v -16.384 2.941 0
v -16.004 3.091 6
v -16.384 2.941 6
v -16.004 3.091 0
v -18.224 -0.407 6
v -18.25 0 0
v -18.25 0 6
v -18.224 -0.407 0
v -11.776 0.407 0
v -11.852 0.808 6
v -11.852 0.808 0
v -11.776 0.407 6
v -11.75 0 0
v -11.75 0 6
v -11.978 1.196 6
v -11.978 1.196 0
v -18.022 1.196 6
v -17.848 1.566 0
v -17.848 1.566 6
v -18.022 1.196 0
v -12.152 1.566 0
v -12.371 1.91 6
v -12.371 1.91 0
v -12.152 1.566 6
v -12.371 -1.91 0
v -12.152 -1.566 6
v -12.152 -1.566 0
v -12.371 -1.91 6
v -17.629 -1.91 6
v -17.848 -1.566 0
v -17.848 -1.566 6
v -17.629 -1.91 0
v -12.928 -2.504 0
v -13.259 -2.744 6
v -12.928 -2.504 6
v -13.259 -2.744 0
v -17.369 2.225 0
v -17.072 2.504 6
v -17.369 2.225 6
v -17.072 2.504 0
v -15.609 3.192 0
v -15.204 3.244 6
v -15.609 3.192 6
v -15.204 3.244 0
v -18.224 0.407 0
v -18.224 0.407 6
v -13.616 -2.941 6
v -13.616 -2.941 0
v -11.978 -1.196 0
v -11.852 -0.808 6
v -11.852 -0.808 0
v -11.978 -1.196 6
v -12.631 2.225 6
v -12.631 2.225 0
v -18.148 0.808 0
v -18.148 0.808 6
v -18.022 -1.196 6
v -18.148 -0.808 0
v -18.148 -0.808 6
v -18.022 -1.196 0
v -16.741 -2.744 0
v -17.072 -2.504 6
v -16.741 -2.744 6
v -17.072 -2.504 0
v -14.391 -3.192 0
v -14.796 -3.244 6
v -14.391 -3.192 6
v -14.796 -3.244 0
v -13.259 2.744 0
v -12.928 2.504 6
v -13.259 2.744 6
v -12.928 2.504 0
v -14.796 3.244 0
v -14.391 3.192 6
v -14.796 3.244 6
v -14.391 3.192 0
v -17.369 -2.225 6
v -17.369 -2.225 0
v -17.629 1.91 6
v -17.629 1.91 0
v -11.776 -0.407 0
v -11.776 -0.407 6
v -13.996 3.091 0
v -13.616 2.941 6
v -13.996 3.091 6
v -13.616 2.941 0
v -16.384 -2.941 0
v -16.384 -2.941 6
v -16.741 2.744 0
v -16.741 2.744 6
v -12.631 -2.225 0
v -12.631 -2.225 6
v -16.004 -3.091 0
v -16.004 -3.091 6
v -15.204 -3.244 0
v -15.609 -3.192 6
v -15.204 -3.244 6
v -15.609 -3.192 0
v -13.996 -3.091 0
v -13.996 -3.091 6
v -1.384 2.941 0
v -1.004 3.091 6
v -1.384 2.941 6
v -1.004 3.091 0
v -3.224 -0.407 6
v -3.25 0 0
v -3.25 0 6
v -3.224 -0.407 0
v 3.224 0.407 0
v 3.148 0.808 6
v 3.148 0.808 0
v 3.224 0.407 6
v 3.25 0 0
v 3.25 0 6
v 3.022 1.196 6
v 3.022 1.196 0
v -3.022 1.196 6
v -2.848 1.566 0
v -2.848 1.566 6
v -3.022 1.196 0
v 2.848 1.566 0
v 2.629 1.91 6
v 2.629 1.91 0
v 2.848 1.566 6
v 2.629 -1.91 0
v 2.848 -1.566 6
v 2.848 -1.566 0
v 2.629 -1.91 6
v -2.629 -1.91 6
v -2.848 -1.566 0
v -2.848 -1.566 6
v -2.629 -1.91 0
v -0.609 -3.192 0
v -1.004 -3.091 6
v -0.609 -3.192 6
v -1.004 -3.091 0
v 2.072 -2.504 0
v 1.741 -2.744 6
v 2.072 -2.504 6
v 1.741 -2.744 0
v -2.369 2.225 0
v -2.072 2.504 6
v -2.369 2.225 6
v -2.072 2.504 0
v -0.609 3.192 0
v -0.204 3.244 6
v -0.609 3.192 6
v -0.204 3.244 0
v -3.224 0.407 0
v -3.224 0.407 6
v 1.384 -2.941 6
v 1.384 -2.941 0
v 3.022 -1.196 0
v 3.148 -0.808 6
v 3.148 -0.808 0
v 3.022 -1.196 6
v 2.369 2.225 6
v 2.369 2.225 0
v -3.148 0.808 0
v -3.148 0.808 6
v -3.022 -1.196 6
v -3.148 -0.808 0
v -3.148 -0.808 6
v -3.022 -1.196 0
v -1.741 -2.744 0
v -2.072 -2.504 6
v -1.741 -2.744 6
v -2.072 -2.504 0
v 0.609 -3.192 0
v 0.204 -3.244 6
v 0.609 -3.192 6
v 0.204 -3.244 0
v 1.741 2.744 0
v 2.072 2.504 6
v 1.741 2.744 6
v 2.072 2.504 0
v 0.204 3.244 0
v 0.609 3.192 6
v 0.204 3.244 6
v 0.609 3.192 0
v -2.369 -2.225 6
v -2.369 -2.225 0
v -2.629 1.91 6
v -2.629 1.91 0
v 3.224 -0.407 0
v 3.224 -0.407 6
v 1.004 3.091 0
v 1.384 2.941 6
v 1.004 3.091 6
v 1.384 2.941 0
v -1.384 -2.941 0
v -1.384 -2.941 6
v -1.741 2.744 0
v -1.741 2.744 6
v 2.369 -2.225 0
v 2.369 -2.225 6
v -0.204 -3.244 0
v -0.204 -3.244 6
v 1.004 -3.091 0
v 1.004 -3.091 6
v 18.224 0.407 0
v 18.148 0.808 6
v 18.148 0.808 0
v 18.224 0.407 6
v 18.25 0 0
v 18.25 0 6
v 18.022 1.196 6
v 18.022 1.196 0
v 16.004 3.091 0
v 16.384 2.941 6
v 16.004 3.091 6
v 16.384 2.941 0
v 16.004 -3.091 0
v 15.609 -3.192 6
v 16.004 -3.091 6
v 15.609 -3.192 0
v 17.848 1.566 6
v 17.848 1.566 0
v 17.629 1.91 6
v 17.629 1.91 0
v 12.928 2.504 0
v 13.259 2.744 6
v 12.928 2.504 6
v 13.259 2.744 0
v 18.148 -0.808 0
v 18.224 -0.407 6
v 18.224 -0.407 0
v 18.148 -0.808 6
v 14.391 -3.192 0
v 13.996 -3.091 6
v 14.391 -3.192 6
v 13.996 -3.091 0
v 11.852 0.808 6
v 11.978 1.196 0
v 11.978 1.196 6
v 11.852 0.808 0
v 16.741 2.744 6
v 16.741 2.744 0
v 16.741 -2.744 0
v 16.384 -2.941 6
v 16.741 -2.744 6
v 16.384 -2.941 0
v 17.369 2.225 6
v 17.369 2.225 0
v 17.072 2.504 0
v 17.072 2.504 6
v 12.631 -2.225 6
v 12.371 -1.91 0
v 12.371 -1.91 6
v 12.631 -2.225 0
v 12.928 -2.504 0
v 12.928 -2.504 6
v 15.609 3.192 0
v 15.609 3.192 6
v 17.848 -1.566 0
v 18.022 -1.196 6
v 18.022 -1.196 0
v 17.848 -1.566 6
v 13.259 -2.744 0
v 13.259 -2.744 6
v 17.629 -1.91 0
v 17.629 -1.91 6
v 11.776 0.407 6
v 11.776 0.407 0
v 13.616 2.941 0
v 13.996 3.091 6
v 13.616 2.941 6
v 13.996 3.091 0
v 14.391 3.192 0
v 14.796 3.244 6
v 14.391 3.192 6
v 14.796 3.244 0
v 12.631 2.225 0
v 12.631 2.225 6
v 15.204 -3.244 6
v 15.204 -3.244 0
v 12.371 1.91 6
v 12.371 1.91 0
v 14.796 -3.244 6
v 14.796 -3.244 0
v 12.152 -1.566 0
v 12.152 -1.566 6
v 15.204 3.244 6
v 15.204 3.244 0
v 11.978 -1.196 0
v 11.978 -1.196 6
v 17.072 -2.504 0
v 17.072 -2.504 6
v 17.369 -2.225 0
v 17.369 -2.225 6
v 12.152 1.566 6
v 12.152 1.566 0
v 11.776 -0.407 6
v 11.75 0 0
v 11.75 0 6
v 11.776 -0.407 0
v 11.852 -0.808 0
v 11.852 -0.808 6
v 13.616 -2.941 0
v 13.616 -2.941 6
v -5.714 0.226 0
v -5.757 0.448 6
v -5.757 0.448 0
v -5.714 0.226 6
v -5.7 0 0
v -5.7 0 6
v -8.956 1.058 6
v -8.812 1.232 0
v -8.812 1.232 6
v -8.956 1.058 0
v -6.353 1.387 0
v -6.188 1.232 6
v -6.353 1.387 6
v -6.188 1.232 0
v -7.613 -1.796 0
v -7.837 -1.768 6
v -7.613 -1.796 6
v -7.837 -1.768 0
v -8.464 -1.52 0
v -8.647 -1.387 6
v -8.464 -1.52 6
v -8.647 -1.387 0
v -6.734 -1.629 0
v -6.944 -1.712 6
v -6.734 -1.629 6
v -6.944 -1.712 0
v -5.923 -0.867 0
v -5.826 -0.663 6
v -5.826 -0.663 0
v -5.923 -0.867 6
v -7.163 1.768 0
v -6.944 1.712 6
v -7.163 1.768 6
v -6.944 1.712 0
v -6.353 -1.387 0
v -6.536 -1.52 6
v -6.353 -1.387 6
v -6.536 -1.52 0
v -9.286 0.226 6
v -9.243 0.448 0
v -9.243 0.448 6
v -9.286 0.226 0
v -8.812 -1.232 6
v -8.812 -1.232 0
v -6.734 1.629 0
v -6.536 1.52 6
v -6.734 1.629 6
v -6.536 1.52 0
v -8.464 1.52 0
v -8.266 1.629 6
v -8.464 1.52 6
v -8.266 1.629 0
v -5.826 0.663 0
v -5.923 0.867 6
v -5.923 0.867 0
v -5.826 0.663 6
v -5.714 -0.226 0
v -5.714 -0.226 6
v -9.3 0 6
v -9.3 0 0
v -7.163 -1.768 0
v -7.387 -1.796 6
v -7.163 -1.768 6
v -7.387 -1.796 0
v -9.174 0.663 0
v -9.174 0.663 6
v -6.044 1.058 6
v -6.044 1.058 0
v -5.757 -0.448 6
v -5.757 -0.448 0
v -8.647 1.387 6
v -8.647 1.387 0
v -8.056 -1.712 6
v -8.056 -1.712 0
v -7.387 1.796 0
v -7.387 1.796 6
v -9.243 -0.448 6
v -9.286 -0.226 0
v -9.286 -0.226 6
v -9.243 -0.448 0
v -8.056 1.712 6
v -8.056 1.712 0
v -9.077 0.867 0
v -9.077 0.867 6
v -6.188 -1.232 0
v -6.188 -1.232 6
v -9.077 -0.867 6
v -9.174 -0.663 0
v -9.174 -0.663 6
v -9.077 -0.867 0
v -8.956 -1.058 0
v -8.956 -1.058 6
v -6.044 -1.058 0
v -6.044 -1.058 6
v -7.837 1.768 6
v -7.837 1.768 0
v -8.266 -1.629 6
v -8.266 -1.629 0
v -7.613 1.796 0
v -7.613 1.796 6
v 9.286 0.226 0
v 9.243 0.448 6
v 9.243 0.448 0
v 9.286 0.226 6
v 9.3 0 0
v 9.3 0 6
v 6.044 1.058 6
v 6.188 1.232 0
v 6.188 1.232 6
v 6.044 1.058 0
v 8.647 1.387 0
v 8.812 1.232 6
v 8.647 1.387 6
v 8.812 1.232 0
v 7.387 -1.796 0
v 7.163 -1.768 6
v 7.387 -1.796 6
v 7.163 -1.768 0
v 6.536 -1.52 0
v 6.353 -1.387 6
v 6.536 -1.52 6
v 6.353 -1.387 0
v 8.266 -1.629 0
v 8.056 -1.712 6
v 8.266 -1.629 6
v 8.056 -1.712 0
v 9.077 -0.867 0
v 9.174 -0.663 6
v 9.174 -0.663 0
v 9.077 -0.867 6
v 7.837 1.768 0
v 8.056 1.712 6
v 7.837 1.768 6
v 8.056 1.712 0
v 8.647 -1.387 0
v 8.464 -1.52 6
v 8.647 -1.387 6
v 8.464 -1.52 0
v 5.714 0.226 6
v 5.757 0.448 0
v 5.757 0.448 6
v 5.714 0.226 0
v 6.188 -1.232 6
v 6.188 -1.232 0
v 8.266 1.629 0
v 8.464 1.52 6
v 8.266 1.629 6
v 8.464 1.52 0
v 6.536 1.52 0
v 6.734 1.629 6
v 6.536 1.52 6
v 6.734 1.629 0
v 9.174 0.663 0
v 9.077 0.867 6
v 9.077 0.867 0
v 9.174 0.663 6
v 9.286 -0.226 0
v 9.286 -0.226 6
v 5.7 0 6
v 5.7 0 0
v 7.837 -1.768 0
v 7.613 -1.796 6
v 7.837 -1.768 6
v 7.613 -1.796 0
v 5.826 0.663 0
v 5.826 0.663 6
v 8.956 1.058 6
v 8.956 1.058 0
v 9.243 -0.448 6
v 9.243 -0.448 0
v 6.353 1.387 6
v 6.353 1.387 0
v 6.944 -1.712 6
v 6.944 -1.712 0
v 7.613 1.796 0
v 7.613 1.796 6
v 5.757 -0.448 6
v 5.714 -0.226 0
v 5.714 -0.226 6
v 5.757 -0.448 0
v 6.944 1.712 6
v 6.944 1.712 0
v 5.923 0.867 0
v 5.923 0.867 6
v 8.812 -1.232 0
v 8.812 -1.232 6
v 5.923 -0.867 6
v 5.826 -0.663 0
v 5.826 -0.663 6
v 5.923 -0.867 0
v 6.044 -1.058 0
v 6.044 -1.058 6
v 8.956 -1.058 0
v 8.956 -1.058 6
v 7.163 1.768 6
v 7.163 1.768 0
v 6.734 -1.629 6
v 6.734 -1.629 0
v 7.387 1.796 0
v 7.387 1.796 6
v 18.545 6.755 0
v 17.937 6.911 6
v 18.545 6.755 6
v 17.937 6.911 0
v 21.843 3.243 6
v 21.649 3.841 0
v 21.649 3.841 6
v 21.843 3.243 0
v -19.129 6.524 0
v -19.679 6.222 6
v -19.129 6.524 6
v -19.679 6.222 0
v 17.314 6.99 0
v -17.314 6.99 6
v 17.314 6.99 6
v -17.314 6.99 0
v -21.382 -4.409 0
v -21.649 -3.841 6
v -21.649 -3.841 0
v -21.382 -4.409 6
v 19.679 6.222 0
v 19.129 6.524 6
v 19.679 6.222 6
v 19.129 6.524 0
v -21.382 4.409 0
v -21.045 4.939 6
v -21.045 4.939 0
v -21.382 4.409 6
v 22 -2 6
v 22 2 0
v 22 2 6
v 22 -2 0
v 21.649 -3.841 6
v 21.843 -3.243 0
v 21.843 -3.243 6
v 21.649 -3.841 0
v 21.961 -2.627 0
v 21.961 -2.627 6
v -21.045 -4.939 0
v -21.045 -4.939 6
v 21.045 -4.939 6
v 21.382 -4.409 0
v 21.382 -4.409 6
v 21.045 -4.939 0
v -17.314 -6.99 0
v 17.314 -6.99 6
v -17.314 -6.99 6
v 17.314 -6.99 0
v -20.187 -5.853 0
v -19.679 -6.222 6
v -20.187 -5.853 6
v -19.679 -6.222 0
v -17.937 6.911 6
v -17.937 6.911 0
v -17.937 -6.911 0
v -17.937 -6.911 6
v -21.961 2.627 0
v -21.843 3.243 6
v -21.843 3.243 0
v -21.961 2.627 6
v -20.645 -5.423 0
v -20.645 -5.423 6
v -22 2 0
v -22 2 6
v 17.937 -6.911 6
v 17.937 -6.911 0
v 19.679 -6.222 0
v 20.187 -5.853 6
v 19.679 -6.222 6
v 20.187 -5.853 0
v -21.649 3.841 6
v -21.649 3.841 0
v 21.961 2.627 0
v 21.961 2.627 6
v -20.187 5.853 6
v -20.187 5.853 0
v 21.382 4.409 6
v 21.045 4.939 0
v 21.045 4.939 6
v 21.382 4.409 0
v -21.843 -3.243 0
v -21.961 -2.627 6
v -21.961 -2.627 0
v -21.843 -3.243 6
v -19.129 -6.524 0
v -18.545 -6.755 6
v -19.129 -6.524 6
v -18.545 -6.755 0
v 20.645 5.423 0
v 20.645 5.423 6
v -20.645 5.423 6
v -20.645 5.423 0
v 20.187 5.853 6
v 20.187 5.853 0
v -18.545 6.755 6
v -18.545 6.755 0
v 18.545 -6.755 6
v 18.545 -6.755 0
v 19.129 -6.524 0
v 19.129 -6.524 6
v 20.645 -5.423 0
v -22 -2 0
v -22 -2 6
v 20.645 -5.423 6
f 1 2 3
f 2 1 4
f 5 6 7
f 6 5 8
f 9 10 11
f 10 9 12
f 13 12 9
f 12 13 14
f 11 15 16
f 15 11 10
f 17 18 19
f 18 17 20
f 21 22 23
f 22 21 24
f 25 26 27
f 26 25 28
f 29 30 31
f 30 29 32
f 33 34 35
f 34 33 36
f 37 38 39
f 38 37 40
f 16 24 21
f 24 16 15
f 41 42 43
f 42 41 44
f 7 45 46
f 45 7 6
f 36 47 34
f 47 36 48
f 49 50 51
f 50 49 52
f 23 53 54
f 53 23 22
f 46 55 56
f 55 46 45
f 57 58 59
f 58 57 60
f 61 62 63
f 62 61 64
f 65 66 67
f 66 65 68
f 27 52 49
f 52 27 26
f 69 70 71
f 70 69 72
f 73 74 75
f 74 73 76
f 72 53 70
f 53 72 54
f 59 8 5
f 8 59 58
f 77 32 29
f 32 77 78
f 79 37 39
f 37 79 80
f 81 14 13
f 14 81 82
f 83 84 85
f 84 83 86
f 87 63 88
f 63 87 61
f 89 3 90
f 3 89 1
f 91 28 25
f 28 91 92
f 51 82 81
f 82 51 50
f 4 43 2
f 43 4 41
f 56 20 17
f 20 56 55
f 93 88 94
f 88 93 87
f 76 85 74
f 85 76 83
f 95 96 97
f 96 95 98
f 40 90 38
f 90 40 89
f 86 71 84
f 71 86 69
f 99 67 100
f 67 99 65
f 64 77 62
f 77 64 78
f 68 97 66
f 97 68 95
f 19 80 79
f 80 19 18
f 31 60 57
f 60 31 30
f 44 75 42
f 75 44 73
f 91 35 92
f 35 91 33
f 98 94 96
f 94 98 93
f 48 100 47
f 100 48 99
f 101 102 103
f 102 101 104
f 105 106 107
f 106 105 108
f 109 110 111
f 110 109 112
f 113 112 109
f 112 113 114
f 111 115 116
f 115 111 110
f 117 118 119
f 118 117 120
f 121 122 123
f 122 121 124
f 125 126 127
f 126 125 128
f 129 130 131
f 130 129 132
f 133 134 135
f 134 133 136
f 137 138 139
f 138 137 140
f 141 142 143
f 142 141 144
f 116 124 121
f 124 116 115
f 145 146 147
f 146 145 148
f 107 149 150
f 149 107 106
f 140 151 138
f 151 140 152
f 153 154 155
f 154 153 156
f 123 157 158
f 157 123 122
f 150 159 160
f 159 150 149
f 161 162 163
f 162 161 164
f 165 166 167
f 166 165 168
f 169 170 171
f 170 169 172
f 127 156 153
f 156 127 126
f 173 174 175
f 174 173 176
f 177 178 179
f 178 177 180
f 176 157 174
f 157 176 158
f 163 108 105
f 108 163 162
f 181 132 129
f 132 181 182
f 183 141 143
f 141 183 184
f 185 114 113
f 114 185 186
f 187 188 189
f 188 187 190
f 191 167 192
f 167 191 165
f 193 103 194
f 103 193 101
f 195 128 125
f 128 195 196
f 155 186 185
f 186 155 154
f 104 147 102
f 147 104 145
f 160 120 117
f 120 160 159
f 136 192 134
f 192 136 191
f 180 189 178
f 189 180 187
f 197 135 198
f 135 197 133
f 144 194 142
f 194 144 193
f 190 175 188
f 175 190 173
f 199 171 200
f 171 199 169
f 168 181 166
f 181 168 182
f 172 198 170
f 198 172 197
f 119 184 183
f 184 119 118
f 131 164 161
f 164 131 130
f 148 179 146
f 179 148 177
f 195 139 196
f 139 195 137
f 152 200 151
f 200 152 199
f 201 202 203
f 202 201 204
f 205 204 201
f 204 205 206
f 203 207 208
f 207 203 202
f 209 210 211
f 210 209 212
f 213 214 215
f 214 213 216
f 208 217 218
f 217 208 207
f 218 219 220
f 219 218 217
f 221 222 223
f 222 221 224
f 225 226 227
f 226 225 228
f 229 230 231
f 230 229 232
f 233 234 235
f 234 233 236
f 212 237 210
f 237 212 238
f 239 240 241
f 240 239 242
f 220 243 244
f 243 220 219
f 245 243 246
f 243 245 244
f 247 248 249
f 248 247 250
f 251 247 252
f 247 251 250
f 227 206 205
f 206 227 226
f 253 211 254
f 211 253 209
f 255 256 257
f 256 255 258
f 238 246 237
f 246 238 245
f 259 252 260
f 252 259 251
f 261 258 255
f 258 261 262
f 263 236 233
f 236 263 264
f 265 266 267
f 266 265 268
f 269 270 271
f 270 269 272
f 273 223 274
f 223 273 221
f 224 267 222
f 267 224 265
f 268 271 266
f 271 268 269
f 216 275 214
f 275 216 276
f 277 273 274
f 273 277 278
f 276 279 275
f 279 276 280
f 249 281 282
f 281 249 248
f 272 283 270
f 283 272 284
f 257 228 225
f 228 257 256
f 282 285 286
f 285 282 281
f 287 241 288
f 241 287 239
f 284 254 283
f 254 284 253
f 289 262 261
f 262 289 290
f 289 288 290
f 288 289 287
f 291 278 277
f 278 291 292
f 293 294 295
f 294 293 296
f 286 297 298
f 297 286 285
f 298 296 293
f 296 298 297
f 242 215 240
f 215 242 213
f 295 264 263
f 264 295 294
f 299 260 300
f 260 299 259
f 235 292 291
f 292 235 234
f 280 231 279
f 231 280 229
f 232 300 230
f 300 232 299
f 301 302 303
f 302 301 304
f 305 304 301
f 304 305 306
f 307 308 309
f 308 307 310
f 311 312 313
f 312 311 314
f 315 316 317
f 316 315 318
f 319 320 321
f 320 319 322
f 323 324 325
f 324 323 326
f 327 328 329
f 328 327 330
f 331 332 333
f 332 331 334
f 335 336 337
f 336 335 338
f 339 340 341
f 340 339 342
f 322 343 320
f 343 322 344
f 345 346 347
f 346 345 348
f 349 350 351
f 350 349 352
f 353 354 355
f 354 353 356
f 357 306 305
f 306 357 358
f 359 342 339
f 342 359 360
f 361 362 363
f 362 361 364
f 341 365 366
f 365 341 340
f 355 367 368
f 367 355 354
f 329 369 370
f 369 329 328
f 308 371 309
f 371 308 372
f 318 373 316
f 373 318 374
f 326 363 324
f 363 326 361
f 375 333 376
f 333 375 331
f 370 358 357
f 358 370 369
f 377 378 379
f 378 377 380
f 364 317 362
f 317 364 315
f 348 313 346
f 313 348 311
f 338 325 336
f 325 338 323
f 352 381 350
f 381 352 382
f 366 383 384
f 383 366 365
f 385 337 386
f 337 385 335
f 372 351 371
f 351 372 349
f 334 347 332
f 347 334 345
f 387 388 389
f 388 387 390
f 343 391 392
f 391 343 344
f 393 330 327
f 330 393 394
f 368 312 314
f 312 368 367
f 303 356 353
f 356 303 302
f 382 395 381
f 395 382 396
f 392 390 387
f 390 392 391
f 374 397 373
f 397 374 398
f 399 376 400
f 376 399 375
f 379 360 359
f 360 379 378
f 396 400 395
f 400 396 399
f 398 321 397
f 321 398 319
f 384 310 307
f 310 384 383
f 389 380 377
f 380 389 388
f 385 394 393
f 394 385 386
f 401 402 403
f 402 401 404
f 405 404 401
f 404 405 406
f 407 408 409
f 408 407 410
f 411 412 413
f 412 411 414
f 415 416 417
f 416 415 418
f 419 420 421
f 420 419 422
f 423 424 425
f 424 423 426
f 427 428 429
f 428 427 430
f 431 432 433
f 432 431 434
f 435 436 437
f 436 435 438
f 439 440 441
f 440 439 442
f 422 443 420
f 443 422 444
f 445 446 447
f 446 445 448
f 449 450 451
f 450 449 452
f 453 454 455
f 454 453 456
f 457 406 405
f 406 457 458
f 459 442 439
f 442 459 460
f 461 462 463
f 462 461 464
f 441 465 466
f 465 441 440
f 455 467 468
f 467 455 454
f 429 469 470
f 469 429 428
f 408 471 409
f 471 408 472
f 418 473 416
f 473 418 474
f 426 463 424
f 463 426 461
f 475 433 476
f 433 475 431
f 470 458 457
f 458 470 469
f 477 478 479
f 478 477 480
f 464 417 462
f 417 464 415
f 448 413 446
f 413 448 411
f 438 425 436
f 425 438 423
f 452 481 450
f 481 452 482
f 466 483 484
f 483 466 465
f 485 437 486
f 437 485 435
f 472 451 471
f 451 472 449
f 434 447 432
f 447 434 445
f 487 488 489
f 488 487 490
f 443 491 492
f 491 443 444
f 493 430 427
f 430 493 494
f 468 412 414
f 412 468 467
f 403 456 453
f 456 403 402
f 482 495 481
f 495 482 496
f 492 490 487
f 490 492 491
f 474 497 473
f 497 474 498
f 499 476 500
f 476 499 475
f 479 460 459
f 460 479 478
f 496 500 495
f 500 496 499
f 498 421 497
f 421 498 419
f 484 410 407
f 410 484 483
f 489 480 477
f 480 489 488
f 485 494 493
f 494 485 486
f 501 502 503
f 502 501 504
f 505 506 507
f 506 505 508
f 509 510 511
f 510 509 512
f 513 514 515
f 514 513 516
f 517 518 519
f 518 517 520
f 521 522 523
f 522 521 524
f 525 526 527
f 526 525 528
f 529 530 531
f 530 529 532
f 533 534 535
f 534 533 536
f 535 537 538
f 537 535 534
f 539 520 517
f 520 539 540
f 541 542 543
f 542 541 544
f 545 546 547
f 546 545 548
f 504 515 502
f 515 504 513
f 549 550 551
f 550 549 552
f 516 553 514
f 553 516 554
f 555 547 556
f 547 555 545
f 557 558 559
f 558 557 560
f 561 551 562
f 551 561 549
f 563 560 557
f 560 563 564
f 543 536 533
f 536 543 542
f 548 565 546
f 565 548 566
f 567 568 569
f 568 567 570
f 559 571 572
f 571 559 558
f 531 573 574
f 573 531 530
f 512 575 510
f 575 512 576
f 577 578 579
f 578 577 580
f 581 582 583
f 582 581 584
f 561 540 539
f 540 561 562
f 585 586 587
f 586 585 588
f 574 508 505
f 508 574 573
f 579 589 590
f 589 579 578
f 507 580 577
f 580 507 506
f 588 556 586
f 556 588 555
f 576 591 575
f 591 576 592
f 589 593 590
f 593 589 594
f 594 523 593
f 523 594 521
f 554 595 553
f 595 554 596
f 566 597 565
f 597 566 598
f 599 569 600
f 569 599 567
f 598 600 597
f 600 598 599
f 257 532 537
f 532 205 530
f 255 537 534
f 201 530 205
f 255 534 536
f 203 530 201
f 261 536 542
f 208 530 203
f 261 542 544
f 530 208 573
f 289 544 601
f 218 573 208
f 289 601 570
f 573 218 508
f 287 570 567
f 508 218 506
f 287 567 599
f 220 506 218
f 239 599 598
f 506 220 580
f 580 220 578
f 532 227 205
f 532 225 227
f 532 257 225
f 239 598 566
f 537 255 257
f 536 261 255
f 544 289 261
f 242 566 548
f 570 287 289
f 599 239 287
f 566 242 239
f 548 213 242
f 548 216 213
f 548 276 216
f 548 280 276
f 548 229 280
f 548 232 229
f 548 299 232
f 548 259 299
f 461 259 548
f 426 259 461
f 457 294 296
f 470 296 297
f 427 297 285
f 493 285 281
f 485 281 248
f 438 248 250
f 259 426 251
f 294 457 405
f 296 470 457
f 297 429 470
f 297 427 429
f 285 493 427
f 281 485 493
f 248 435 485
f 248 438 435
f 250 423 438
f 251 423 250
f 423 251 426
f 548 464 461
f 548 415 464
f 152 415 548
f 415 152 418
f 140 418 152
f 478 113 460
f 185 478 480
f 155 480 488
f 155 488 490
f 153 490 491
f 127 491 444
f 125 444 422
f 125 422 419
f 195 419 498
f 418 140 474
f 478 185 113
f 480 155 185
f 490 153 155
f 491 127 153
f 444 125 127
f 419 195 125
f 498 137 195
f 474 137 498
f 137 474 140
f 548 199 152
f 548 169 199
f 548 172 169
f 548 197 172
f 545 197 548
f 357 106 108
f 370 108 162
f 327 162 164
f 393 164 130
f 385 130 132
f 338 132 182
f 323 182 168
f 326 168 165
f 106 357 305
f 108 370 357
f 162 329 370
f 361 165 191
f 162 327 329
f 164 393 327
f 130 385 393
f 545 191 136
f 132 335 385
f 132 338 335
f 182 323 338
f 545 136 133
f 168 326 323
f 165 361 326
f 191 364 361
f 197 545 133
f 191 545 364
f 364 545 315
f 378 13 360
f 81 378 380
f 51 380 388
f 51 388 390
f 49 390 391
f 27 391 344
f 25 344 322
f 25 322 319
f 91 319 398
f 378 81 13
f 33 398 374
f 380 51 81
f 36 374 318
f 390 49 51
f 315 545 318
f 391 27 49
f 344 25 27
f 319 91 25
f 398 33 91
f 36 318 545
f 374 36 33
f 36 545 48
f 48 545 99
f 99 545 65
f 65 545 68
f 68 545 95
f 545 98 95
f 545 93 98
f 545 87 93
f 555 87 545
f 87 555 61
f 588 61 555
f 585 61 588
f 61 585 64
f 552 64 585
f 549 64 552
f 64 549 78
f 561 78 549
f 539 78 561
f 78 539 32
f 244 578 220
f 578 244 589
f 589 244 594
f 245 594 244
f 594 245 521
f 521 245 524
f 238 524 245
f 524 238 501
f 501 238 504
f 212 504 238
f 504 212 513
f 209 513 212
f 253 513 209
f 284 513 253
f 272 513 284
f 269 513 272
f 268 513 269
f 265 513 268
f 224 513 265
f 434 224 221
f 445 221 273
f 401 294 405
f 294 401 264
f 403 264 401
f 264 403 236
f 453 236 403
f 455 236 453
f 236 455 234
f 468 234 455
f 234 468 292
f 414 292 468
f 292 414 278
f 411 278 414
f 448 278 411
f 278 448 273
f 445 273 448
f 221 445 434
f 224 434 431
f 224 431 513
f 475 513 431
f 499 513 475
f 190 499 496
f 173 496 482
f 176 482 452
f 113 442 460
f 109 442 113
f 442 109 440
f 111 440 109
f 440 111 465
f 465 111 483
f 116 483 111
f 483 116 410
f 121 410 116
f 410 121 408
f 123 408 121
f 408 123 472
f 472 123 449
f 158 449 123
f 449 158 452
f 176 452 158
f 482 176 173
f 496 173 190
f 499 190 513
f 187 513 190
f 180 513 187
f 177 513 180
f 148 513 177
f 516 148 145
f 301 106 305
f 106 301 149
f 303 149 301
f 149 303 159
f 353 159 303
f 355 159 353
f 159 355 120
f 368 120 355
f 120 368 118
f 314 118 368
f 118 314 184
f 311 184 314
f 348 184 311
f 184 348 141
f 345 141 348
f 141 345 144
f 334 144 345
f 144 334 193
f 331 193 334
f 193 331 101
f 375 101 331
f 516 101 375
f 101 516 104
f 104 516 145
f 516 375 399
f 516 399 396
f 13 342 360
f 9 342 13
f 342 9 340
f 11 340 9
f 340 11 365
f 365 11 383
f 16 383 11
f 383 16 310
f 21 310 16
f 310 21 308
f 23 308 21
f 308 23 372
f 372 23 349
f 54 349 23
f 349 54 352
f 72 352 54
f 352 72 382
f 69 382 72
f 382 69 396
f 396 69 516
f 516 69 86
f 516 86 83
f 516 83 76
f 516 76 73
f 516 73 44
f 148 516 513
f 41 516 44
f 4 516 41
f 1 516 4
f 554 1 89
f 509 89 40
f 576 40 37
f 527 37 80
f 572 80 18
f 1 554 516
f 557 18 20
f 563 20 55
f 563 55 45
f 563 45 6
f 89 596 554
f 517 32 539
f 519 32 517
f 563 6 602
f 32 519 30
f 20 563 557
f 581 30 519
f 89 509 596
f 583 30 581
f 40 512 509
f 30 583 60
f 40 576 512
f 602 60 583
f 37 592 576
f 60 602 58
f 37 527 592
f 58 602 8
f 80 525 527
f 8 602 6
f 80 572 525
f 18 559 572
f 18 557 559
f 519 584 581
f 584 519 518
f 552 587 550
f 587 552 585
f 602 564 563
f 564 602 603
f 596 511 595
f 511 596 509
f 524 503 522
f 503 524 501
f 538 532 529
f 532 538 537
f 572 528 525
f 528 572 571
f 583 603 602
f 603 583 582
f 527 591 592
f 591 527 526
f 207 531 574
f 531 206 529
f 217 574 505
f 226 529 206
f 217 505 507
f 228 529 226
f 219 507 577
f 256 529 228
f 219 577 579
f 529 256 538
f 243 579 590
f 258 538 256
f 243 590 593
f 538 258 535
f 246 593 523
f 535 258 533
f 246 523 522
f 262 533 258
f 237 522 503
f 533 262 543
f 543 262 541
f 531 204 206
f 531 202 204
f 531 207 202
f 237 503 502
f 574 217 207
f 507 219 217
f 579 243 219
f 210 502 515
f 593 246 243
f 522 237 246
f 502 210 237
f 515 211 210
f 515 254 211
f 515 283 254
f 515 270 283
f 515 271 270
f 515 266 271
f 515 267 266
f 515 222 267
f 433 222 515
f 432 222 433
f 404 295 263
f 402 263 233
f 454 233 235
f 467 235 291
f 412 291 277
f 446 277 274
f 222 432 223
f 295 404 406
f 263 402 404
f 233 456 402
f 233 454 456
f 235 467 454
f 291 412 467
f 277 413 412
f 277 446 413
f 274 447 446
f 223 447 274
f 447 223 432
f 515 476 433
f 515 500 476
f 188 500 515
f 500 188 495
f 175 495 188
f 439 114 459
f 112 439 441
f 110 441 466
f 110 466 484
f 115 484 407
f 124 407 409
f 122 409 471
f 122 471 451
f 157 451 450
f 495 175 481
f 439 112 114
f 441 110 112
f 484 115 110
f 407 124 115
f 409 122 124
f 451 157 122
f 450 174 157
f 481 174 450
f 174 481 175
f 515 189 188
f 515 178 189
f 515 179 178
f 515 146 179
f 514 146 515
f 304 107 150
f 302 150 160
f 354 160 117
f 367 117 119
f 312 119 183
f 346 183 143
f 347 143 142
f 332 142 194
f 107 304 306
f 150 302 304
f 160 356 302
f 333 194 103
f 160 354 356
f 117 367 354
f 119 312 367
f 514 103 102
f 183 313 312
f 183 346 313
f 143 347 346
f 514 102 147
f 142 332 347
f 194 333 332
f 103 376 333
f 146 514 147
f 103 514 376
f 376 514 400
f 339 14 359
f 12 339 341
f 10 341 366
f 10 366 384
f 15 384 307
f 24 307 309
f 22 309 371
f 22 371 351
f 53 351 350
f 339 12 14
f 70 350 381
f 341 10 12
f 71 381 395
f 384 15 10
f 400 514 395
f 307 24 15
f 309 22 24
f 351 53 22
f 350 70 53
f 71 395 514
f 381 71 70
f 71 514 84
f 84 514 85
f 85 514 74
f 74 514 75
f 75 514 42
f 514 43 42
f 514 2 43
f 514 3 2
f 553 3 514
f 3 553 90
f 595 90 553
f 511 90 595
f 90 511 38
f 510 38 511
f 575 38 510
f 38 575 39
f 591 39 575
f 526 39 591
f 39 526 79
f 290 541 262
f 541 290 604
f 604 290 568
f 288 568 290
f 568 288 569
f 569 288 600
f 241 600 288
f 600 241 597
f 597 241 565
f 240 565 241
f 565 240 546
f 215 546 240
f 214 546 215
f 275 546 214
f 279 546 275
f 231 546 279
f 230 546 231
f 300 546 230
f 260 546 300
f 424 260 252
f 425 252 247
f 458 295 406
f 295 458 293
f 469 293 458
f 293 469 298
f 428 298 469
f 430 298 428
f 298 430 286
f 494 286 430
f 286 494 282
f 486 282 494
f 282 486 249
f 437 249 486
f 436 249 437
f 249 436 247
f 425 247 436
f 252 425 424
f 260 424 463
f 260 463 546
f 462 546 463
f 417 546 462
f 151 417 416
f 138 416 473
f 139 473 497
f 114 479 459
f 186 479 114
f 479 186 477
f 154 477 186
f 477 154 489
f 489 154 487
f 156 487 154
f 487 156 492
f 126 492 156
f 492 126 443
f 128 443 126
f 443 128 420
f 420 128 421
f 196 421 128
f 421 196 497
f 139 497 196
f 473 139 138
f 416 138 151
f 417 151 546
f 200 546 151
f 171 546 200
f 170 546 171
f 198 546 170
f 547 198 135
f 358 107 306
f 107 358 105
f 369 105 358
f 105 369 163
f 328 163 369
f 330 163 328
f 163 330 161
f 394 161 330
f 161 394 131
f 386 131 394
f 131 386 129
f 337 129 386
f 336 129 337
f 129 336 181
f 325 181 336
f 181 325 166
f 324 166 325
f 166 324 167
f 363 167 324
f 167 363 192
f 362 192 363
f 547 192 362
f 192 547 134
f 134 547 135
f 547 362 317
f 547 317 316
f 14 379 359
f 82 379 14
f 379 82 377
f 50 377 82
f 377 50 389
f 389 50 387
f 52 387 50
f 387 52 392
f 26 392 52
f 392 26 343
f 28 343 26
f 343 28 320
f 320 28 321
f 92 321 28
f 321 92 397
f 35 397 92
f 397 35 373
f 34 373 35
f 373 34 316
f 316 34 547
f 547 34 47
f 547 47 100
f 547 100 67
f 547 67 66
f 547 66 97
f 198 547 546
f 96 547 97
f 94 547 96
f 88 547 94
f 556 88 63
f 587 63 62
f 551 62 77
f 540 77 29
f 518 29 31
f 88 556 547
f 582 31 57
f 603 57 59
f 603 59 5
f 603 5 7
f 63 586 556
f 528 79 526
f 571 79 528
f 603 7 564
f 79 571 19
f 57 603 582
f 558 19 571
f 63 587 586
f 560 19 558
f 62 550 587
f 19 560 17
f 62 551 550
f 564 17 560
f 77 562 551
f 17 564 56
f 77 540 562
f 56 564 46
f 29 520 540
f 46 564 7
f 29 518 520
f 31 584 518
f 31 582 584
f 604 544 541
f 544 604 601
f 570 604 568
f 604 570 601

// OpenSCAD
$fn = 50;


difference() {
	union() {
		*color(alpha = 1.0000000000, c = "gray") {
			translate(v = [0, 7, 0]) {
				linear_extrude(height = 1) {
					text(font = "Arial:style=Bold", halign = "center", size = 4.5000000000, text = "COMMENT plate main", valign = "center");
				}
			}
		}
		hull() {
			translate(v = [-17.0000000000, 2.0000000000, 0]) {
				cylinder(h = 6, r = 5);
			}
			translate(v = [17.0000000000, 2.0000000000, 0]) {
				cylinder(h = 6, r = 5);
			}
			translate(v = [-17.0000000000, -2.0000000000, 0]) {
				cylinder(h = 6, r = 5);
			}
			translate(v = [17.0000000000, -2.0000000000, 0]) {
				cylinder(h = 6, r = 5);
			}
		}
	}
	union() {
		*color(alpha = 1.0000000000, c = "gray") {
			translate(v = [0, 7, 0]) {
				linear_extrude(height = 1) {
					text(font = "Arial:style=Bold", halign = "center", size = 4.5000000000, text = "COMMENT holes main", valign = "center");
				}
			}
		}
		translate(v = [-15.0000000000, 0.0000000000, 0]) {
			translate(v = [0, 0, -100]) {
				cylinder(h = 200, r = 3.2500000000);
			}
		}
		translate(v = [0, 0, -100]) {
			cylinder(h = 200, r = 3.2500000000);
		}
		translate(v = [15.0000000000, 0.0000000000, 0]) {
			translate(v = [0, 0, -100]) {
				cylinder(h = 200, r = 3.2500000000);
			}
		}
		translate(v = [-15.0000000000, 0.0000000000, 0]) {
			translate(v = [0, 0, -100]) {
				cylinder(h = 200, r = 1.8000000000);
			}
		}
		translate(v = [-7.5000000000, 0.0000000000, 0]) {
			translate(v = [0, 0, -100]) {
				cylinder(h = 200, r = 1.8000000000);
			}
		}
		translate(v = [0, 0, -100]) {
			cylinder(h = 200, r = 1.8000000000);
		}
		translate(v = [7.5000000000, 0.0000000000, 0]) {
			translate(v = [0, 0, -100]) {
				cylinder(h = 200, r = 1.8000000000);
			}
		}
		translate(v = [15.0000000000, 0.0000000000, 0]) {
			translate(v = [0, 0, -100]) {
				cylinder(h = 200, r = 1.8000000000);
			}
		}
	}
}
